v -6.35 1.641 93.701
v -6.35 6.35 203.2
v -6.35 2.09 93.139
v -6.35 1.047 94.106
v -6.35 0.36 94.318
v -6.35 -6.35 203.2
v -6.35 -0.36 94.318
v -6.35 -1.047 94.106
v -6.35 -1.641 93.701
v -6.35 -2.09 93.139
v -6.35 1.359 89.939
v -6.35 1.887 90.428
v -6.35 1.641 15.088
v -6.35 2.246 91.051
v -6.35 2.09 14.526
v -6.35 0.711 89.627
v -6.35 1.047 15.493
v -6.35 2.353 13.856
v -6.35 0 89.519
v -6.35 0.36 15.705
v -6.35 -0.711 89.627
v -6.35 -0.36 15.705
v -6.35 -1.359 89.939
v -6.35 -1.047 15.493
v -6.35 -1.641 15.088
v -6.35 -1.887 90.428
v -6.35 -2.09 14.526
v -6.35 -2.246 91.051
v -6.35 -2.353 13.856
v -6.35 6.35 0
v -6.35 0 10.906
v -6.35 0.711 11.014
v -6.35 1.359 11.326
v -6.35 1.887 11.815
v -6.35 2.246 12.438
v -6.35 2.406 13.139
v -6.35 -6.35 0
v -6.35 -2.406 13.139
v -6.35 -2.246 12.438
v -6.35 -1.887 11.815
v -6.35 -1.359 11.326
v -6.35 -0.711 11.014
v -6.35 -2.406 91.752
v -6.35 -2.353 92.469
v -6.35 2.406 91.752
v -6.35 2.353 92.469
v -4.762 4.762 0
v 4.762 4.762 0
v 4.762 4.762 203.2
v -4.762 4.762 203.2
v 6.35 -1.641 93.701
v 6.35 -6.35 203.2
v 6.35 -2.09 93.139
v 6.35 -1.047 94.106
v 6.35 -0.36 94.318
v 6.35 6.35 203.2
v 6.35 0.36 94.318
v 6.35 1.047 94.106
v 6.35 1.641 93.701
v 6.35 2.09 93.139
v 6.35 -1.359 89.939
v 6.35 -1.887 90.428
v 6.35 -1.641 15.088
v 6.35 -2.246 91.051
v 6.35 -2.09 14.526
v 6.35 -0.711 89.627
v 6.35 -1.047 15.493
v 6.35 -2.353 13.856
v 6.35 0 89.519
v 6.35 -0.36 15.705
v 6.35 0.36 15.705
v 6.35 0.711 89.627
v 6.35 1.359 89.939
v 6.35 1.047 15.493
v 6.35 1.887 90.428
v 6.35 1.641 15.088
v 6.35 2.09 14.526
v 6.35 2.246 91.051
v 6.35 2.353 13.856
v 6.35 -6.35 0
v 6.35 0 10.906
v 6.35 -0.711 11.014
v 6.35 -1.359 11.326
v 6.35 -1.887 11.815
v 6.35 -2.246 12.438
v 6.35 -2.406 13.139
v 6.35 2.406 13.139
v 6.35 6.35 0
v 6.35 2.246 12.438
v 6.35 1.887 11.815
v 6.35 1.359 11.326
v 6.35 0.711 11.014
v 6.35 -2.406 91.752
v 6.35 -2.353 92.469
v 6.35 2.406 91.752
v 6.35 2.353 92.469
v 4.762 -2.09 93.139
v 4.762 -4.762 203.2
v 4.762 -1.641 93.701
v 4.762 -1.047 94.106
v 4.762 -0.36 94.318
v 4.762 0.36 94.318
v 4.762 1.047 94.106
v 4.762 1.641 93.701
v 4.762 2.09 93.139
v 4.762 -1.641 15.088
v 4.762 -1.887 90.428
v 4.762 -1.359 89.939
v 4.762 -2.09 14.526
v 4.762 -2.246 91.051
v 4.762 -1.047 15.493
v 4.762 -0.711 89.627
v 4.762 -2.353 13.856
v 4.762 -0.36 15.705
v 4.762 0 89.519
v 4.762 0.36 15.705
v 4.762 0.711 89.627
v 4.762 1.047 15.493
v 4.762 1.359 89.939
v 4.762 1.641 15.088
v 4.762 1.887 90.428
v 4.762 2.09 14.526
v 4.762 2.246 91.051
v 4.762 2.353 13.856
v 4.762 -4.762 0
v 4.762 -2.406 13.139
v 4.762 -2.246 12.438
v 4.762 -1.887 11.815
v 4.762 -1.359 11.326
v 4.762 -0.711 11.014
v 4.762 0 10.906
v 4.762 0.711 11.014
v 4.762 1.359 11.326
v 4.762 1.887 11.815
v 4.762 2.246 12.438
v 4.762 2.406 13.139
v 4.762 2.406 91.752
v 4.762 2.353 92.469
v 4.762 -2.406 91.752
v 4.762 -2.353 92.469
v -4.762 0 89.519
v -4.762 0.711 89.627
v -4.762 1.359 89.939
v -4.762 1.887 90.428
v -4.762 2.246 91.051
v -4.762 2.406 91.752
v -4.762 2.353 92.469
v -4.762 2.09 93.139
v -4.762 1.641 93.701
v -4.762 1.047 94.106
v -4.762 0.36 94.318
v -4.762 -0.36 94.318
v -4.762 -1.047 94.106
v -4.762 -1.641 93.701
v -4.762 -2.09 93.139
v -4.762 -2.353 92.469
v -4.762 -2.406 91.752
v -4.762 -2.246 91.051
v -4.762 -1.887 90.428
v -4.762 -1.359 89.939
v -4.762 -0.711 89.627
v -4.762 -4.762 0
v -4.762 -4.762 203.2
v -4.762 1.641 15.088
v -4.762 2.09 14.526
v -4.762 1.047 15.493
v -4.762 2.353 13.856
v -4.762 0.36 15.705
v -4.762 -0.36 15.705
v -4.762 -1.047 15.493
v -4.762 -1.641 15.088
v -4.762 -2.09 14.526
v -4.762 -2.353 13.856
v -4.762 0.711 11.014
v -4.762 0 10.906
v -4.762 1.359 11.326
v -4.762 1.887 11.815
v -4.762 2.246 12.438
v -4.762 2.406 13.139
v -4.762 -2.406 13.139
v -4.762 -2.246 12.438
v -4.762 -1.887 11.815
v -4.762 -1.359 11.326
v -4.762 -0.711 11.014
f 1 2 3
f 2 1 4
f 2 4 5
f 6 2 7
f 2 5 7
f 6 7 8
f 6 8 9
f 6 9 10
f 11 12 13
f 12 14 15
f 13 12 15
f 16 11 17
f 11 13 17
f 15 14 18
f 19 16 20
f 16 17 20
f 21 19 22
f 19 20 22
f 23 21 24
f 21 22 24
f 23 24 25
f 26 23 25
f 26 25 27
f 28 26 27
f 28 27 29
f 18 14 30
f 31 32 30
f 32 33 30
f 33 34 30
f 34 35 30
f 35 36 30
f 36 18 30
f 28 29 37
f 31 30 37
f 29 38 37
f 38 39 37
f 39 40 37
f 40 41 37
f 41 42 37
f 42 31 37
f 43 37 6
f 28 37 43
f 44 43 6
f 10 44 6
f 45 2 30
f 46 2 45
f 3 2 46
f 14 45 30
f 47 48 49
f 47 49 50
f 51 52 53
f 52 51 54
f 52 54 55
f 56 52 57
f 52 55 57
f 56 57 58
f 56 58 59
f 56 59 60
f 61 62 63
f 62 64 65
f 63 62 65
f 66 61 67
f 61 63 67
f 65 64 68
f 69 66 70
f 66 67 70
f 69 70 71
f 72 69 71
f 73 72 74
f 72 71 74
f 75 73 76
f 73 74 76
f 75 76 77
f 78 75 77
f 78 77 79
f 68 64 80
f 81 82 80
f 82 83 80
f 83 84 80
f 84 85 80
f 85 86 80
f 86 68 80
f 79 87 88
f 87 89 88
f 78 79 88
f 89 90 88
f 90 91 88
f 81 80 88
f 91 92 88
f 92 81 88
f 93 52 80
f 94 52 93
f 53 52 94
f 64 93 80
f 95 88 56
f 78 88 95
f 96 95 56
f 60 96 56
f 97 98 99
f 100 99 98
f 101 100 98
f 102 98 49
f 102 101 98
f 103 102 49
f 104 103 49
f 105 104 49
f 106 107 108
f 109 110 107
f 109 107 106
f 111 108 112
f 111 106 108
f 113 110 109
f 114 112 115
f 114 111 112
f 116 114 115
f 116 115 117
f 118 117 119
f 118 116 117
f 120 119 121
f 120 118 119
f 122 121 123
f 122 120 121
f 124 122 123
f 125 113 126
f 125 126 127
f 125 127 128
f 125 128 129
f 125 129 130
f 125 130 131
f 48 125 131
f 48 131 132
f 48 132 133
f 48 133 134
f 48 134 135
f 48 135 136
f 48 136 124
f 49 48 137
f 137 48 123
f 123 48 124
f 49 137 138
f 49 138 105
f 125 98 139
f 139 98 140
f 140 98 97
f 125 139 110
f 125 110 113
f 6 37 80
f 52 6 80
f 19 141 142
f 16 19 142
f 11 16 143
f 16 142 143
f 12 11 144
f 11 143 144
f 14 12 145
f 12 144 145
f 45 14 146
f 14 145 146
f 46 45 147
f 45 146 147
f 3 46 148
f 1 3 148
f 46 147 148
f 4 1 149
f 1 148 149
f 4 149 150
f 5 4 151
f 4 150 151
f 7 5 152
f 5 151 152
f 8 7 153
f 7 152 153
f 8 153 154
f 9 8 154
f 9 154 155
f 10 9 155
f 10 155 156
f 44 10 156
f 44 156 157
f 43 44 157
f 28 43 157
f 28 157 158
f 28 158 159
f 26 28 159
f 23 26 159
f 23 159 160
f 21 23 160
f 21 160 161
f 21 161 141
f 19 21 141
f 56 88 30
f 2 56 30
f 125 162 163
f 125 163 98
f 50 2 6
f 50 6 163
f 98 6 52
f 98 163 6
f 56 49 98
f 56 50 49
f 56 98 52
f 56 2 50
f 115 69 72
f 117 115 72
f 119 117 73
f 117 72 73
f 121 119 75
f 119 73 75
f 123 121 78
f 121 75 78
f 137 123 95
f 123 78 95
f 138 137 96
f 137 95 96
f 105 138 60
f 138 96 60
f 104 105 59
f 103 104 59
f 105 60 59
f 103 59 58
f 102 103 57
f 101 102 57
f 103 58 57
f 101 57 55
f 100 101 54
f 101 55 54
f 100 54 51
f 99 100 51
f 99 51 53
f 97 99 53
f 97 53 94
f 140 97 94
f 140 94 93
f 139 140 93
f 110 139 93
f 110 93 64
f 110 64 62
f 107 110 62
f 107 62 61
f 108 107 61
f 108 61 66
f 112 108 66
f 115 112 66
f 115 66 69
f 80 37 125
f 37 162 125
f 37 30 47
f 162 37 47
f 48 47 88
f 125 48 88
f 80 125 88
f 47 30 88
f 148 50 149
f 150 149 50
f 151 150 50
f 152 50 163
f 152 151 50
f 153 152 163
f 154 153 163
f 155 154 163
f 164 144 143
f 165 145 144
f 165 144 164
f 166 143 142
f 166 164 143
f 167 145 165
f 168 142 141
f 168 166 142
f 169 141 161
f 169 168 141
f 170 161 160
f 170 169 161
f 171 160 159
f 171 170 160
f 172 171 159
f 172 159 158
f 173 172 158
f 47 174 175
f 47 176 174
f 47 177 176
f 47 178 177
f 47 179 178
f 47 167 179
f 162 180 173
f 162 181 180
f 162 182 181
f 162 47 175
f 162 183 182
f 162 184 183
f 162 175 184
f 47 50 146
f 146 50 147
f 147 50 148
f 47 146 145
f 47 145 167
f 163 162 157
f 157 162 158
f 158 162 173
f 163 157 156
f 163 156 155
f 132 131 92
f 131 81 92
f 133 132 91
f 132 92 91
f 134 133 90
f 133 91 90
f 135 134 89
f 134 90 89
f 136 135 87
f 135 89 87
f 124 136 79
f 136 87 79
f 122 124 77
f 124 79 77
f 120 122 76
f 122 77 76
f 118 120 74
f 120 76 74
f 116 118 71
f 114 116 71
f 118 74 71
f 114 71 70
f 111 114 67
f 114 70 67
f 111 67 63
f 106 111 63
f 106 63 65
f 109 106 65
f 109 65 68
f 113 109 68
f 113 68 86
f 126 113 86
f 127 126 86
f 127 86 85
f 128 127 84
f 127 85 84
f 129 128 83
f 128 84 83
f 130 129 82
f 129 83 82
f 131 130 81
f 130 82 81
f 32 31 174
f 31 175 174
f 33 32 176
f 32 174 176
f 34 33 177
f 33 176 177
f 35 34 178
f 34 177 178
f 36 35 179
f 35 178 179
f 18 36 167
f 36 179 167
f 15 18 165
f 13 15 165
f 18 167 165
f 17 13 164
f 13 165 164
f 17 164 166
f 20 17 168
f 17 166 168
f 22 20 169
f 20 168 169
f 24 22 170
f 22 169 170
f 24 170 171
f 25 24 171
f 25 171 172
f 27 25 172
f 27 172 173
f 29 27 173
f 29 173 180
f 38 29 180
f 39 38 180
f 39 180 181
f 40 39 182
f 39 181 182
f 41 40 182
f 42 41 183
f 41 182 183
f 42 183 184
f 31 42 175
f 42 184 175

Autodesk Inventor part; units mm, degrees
ref_plane "YZ Plane" through (0, 0, 0) normal (1, 0, 0) x (0, 1, 0)
ref_plane "XZ Plane" through (0, 0, 0) normal (0, 1, 0) x (-1, 0, 0)
ref_plane "XY Plane" through (0, 0, 0) normal (0, 0, 1) x (1, 0, 0)
sketch "Sketch1" plane through (0, 0, 0) normal (0, 0, 1) x (1, 0, 0)
  line L0 (-6.35, -6.35) -> (6.35, -6.35)
  line L1 (6.35, -6.35) -> (6.35, 6.35)
  line L2 (6.35, 6.35) -> (-6.35, 6.35)
  line L3 (-6.35, 6.35) -> (-6.35, -6.35)
  line L4 (-6.35, -6.35) -> (6.35, 6.35) construction
  line L5 (6.35, -6.35) -> (-6.35, 6.35) construction
  line L6 (-4.7625, -4.7625) -> (4.7625, -4.7625)
  line L7 (4.7625, -4.7625) -> (4.7625, 4.7625)
  line L8 (4.7625, 4.7625) -> (-4.7625, 4.7625)
  line L9 (-4.7625, 4.7625) -> (-4.7625, -4.7625)
  line L10 (-4.7625, -4.7625) -> (4.7625, 4.7625) construction
  line L11 (4.7625, -4.7625) -> (-4.7625, 4.7625) construction
  point P0 (0, 0)
  point P1 (0, 0)
  dimension "d0" = 12.7
  dimension "d1" = 12.7
  dimension "d2" = 9.525
  dimension "d3" = 9.525
extrude "Extrusion1" add sketch "Sketch1" along normal blind 203.2
sketch "Sketch2" plane through (6.35, -6.35, 0) normal (1, 0, 0) x (0, 0, -1)
  line L0 (0, 0) -> (-203.2, 0) projected
  circle A0 centre (-13.3193, 6.35) radius 2.413
  circle A1 centre (-91.9323, 6.35) radius 2.413
  line L1 (-89.5193, 6.35) -> (-13.3193, 6.35)
  point P0 (0, 6.35)
  dimension "d7" = 4.826
  dimension "d6" = 4.826
  dimension "d8" = 76.2
extrude "Extrusion2" cut sketch "Sketch2" against normal blind 203.2
properties part number "custom box alluminum 8in"
